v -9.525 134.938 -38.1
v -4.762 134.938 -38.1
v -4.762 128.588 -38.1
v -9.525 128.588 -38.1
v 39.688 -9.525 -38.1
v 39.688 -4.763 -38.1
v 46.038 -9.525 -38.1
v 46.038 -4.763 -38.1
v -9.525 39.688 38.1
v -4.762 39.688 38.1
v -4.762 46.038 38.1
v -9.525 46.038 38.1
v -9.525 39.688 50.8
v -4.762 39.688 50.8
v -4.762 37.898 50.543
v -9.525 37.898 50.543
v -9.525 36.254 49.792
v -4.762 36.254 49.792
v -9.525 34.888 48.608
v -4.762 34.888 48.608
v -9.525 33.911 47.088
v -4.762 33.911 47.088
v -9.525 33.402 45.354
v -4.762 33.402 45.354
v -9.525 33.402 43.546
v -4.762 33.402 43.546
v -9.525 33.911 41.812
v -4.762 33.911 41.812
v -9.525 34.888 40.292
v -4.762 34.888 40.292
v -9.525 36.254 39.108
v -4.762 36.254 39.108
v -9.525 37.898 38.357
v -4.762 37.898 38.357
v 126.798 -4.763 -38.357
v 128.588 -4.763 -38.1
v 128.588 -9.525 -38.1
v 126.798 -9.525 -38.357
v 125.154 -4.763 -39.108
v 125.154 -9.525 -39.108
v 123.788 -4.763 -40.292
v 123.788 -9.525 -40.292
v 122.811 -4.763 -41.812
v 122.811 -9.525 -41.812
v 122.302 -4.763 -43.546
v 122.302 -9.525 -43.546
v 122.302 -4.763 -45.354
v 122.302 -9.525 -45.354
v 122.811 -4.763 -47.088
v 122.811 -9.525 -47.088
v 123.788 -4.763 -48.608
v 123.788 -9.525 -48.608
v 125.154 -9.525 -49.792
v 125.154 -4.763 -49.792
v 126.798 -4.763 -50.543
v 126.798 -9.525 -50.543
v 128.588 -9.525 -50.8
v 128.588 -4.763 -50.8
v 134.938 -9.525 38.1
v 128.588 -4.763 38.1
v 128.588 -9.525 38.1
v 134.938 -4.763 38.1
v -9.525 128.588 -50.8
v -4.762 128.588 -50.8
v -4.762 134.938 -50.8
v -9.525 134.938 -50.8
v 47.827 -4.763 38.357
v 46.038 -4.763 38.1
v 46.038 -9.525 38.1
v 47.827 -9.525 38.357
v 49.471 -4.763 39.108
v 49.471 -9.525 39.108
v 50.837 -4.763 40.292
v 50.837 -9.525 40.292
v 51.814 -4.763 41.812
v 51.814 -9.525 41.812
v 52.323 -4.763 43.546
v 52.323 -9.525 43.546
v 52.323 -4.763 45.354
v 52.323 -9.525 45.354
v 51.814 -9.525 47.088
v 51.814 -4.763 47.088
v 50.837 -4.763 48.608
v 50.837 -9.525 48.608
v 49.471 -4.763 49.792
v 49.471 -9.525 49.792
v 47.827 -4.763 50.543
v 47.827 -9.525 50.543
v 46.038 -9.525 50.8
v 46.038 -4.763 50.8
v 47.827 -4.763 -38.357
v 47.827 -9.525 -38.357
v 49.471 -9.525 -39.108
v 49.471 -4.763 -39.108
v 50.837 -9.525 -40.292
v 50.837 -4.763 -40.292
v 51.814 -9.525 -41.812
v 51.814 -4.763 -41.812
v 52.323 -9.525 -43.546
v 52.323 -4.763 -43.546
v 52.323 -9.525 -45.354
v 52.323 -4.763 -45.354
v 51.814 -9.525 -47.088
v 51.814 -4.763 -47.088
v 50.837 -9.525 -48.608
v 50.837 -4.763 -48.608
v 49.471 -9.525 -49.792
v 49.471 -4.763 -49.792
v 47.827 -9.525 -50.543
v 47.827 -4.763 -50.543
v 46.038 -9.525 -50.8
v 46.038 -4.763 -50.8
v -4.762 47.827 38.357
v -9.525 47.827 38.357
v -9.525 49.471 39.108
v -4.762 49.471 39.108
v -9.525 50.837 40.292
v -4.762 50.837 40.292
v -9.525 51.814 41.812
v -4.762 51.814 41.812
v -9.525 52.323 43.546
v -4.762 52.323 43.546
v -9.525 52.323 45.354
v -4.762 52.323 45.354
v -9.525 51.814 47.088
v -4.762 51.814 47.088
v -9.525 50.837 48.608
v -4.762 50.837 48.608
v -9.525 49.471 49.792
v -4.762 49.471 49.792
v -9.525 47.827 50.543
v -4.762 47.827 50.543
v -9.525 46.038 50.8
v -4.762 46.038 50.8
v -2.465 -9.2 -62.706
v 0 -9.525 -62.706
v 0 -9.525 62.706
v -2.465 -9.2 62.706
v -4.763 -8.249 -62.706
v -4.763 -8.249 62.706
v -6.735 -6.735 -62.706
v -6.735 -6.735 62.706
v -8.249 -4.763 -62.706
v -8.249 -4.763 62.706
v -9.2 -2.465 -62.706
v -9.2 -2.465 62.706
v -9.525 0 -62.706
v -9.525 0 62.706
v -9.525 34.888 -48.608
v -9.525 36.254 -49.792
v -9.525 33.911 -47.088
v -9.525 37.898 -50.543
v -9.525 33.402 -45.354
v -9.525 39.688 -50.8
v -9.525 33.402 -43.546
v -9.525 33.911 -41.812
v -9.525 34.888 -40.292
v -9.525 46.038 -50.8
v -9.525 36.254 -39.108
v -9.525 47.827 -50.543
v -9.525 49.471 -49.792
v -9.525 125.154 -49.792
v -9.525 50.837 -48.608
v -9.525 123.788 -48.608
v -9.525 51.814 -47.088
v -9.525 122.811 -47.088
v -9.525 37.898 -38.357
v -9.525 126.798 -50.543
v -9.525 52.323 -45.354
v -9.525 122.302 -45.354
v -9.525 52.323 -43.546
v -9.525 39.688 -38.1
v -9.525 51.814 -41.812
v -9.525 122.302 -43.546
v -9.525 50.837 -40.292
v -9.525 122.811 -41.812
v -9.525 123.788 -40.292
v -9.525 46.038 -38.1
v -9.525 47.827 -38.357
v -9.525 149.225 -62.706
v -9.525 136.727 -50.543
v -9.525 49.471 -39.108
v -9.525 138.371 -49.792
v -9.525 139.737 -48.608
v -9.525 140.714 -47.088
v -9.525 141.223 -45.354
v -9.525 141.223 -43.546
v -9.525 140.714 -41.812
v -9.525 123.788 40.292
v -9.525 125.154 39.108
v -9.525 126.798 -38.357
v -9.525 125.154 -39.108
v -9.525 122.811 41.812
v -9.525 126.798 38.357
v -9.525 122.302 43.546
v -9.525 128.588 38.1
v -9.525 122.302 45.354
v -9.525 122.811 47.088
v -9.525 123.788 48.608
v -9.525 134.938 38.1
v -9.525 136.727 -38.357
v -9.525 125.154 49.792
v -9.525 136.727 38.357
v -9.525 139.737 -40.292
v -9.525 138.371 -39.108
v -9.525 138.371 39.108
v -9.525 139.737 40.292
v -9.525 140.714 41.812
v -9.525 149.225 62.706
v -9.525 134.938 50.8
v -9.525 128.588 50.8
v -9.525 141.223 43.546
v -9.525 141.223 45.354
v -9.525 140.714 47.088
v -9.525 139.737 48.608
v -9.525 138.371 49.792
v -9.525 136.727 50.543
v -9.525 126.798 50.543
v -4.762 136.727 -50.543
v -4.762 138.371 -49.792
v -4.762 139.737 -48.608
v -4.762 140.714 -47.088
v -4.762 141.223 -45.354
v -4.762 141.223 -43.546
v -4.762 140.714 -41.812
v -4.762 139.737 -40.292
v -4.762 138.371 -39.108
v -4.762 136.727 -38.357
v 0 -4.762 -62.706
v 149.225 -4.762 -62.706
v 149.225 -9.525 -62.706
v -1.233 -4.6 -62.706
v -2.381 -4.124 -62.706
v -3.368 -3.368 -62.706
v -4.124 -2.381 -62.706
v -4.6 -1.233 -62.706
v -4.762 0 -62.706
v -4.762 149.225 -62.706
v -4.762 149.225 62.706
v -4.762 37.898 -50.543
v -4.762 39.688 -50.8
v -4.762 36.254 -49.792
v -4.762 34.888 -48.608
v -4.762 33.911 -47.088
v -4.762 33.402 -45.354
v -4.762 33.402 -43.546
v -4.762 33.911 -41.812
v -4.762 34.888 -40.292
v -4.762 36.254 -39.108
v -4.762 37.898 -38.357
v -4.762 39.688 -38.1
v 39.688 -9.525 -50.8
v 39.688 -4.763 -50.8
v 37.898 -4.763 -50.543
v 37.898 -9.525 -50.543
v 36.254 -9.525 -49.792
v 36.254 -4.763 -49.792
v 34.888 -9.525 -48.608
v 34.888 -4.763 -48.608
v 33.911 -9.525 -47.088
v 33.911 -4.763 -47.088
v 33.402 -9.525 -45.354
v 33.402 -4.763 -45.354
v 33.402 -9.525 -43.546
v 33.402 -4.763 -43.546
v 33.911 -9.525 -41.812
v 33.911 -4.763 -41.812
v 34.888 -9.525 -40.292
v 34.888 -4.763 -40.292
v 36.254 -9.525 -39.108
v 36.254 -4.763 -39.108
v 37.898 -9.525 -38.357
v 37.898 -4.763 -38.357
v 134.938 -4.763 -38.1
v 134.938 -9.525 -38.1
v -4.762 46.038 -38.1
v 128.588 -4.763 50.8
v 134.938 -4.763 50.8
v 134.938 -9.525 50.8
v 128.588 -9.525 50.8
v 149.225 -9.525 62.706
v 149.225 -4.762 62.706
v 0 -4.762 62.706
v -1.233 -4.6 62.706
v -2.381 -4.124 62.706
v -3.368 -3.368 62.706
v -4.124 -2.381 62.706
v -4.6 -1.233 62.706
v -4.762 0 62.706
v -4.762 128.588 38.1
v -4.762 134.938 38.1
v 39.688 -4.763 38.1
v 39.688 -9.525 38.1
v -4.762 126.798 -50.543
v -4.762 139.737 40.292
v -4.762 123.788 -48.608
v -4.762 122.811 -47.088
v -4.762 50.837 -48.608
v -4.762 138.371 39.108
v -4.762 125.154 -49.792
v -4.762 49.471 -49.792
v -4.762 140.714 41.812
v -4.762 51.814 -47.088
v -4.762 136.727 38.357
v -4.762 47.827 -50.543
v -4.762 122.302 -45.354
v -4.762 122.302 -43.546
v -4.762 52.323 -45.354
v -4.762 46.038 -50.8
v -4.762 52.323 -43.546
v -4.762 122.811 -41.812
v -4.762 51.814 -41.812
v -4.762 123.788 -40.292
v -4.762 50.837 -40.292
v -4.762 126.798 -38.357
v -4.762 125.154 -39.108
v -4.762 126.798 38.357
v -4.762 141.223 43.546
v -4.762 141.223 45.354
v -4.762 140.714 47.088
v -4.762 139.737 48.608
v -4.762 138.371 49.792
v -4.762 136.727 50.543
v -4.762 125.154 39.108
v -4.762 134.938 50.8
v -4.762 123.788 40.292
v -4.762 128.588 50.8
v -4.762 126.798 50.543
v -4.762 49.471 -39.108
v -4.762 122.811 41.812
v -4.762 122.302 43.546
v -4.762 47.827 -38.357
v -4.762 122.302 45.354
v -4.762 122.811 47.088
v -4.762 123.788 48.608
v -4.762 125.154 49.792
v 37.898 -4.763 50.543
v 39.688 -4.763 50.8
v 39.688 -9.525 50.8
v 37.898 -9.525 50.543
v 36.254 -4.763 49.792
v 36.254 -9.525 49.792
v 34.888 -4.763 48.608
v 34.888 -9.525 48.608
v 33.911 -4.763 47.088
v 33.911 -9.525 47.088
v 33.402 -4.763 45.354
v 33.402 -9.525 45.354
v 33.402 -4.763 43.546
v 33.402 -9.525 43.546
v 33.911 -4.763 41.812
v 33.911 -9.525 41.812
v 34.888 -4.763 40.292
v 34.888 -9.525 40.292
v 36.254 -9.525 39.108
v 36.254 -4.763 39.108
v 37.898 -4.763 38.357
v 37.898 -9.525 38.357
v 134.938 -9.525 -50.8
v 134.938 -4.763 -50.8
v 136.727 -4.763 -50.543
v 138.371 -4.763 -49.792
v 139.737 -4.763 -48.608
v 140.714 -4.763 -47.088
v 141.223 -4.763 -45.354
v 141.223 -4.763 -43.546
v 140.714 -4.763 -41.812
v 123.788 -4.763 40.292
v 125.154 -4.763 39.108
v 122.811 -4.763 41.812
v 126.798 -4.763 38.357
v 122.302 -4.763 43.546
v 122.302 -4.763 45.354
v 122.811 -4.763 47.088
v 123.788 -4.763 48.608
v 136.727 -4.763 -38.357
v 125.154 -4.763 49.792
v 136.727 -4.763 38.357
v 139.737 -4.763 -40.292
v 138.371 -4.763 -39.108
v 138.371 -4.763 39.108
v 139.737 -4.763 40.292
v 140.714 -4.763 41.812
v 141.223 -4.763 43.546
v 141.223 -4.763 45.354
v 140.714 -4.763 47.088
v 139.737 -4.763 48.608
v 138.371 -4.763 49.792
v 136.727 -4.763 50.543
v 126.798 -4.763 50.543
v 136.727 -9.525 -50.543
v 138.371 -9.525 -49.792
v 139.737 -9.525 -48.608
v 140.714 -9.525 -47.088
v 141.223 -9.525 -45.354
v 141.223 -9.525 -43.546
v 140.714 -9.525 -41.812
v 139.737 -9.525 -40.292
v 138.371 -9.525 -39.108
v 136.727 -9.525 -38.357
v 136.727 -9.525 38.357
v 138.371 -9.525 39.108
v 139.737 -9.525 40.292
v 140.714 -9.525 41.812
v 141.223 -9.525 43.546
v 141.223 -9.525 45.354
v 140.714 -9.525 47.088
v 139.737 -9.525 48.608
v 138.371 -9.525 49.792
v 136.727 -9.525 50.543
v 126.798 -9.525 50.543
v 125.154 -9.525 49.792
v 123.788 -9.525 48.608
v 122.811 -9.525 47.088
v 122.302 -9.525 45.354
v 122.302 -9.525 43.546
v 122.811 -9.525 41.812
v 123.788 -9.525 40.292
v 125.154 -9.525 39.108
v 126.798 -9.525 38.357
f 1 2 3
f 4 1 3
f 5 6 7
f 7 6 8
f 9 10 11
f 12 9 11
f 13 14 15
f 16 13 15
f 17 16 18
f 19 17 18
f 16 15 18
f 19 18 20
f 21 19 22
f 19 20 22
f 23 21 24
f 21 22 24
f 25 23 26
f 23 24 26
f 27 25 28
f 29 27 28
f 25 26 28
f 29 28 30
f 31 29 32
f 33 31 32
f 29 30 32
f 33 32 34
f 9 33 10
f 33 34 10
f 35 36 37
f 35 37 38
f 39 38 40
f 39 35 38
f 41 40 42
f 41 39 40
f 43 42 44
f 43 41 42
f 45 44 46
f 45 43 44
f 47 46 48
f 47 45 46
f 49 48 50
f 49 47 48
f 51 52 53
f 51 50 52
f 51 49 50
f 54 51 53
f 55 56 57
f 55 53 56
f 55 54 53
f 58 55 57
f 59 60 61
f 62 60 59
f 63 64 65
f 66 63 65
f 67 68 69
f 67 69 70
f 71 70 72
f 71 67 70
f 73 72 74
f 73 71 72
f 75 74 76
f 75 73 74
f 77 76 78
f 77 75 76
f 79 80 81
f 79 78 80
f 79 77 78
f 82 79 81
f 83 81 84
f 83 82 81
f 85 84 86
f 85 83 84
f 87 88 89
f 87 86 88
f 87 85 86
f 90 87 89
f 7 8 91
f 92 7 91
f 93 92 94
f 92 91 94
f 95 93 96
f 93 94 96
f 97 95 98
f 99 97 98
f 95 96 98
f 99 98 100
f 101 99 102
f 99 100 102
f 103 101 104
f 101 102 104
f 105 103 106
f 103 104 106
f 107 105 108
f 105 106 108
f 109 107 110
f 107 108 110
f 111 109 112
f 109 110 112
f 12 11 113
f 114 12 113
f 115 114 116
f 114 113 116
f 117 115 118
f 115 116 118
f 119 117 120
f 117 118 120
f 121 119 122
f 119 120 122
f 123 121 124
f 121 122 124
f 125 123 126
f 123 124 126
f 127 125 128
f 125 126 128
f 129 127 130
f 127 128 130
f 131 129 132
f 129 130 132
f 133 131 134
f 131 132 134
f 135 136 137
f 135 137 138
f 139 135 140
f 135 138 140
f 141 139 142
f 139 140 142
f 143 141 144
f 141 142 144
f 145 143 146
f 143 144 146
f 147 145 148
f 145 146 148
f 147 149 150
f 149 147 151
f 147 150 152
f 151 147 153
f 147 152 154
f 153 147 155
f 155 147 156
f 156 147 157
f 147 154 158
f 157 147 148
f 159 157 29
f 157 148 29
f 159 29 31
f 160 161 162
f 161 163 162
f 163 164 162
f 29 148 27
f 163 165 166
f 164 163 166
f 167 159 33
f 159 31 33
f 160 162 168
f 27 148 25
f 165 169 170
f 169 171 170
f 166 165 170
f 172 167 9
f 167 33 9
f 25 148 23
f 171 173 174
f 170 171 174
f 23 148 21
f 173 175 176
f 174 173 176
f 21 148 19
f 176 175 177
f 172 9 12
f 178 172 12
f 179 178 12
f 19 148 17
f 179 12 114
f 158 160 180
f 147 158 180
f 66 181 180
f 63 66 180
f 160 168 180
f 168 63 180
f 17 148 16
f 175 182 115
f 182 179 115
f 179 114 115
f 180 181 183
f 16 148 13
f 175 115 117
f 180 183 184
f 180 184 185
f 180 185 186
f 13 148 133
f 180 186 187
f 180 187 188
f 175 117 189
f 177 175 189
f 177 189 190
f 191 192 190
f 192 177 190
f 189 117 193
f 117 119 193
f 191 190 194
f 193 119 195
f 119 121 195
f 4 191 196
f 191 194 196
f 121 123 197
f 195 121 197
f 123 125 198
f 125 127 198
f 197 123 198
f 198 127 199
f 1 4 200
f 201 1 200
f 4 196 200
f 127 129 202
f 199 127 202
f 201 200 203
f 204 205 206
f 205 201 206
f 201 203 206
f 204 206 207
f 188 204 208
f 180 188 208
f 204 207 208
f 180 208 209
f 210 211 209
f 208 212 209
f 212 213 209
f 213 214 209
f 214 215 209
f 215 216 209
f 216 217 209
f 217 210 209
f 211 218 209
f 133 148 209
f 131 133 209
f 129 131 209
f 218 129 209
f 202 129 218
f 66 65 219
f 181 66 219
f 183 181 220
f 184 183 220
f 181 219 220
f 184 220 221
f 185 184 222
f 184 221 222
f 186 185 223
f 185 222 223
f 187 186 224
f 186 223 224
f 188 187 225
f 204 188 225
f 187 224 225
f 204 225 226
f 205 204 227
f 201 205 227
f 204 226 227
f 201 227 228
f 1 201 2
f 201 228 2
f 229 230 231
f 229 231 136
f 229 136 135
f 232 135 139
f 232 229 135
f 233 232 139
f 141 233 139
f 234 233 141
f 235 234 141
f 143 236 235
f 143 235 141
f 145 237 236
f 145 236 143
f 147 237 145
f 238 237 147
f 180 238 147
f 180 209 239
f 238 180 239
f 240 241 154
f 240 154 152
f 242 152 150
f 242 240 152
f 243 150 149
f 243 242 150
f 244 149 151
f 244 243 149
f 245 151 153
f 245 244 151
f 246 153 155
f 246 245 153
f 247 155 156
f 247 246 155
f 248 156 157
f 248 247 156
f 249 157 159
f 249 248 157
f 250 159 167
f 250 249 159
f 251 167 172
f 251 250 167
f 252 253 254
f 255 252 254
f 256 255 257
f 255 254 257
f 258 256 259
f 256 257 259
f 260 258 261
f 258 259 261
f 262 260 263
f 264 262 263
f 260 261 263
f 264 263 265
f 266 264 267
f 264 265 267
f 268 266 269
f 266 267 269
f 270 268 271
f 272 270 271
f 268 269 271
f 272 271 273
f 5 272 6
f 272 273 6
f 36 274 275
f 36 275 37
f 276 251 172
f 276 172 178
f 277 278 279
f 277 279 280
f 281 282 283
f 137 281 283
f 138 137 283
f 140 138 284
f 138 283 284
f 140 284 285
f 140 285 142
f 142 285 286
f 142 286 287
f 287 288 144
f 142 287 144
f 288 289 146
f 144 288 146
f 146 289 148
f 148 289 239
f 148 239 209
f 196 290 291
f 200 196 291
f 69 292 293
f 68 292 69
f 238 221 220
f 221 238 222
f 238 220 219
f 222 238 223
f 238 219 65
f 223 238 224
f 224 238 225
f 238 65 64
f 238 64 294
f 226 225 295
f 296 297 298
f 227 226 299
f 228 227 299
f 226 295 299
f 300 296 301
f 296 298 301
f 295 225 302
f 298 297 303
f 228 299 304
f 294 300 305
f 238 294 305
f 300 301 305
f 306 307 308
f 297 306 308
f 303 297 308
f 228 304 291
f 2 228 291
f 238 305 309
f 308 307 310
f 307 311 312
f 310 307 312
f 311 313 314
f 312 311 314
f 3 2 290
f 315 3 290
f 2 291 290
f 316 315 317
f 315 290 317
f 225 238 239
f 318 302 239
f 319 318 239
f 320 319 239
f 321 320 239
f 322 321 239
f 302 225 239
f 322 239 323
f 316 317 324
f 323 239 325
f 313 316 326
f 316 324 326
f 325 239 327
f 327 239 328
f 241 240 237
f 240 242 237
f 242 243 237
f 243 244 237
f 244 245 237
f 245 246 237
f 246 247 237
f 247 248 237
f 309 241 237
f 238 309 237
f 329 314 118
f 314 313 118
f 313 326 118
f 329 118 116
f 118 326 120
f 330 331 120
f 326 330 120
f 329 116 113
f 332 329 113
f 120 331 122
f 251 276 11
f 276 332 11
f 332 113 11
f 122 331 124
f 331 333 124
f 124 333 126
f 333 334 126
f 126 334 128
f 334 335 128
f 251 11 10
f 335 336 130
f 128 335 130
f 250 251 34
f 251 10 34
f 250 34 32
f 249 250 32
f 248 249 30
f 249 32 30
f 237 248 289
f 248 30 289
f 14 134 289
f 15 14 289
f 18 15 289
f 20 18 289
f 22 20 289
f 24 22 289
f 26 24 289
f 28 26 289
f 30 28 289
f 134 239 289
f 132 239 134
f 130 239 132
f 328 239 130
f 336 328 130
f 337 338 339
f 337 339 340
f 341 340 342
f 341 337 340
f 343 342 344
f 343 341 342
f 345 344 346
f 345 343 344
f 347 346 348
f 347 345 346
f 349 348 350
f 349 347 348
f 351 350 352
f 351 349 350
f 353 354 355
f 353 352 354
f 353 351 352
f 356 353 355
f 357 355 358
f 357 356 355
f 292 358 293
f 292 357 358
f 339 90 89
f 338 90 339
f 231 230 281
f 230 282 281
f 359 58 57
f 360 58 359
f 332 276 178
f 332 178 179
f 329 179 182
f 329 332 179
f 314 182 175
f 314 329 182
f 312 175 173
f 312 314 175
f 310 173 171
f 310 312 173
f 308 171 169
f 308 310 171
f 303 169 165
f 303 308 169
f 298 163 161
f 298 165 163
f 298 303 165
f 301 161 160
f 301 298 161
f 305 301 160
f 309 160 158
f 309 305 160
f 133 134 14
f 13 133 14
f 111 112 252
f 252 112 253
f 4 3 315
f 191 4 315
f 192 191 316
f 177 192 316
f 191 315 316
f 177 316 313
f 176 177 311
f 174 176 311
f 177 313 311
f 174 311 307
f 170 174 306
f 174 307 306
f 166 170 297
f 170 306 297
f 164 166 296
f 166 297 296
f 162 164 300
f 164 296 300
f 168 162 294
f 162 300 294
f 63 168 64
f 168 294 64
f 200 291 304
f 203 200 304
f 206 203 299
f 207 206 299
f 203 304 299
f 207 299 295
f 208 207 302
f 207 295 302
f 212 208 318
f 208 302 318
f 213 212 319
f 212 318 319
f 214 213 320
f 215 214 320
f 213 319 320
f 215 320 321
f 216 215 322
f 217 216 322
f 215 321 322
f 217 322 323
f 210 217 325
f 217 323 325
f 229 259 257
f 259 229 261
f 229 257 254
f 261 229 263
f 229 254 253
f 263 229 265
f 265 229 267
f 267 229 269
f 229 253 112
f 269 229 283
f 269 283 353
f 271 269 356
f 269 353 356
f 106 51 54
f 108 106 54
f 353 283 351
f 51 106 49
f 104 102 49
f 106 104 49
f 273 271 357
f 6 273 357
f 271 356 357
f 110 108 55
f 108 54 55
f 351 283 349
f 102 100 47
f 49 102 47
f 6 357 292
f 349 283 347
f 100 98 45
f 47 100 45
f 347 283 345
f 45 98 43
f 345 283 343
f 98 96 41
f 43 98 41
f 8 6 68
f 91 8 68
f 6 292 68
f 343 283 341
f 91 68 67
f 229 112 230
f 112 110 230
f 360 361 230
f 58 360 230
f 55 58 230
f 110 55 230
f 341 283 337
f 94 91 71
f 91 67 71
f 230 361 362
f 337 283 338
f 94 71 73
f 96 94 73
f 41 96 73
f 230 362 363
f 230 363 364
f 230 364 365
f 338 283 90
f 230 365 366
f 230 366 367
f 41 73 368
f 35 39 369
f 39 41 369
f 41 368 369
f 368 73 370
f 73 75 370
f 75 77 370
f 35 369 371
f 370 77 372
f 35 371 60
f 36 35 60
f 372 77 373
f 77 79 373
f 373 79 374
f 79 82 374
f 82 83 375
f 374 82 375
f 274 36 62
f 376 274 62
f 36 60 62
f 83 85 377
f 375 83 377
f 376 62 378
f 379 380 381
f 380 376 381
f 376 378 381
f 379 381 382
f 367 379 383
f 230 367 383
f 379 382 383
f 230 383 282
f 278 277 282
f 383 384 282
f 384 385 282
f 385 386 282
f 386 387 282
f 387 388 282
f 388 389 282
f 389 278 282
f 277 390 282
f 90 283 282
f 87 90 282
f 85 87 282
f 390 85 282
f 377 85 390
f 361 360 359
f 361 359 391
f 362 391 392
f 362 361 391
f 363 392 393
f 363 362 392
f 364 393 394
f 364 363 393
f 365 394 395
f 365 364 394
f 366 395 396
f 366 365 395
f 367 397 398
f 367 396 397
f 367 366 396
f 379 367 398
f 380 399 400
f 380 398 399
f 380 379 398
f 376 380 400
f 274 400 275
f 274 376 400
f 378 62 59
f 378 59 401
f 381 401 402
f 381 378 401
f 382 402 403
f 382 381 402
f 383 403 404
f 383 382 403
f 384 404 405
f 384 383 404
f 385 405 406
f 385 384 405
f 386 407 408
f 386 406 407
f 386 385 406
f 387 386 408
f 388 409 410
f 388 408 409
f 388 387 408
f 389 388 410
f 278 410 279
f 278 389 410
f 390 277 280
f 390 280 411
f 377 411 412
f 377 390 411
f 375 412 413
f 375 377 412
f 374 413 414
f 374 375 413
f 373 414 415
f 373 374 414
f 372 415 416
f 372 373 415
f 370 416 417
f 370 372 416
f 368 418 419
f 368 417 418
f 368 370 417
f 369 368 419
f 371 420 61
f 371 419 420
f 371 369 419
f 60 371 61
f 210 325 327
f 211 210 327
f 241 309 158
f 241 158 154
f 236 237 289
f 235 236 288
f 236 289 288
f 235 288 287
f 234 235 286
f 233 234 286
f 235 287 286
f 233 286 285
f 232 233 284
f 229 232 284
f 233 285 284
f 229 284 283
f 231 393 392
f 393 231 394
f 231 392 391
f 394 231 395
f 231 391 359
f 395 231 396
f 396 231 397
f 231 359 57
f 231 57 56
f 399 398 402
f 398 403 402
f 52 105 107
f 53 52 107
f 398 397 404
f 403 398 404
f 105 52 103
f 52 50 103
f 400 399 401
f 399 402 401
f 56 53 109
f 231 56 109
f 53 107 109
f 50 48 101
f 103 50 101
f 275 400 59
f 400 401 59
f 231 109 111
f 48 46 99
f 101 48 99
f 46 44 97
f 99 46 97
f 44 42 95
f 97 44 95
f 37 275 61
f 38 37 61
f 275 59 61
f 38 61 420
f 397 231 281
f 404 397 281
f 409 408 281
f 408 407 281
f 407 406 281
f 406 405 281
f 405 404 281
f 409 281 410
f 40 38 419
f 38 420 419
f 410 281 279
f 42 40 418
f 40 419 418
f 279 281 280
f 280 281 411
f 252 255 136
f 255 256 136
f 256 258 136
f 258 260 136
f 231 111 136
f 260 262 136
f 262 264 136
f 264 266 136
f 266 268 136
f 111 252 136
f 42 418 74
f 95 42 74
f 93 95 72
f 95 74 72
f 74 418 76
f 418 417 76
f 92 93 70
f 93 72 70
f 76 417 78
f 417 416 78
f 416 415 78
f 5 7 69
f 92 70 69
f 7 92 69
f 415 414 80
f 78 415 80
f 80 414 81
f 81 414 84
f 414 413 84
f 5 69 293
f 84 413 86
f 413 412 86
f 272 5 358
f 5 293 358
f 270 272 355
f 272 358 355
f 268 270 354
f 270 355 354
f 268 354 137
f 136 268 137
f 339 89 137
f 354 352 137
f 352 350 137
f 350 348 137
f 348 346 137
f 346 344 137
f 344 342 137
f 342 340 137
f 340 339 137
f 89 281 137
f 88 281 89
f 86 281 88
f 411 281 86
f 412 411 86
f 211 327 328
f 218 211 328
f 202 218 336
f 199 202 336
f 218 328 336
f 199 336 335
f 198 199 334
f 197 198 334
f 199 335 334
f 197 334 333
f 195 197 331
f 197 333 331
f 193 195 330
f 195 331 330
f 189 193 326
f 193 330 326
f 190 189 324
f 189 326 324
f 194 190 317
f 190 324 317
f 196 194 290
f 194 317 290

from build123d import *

# Parameters (mm, degrees)
BOSS_EXTRUDE1_DEPTH = 62.70625
CUT_EXTRUDE1_DEPTH  = 224.410663511


with BuildPart() as part:
    # Sketch1 → Boss-Extrude1 (new, symmetric)
    with BuildSketch(Plane.XY):
        with BuildLine():
            Line((-9.525, 149.225), (-4.7625, 149.225))
            Line((-4.7625, 149.225), (-4.7625, 0))
            ThreePointArc((-4.7625, 0), (-3.367596045, -3.367596045), (0, -4.7625))
            Line((0, -4.7625), (149.225, -4.7625))
            Line((149.225, -4.7625), (149.225, -9.525))
            Line((149.225, -9.525), (0, -9.525))
            ThreePointArc((0, -9.525), (-6.735192091, -6.735192091), (-9.525, 0))
            Line((-9.525, 0), (-9.525, 149.225))
        make_face()
    extrude(amount=BOSS_EXTRUDE1_DEPTH, both=True)

    # Sketch2 → Cut-Extrude1 (cut, through all)
    with BuildSketch(Plane(origin=(-4.7625, 0, 0), x_dir=(0, 0, -1), z_dir=(1, 0, 0))):
        with BuildLine():
            Line((-50.8, 134.9375), (-50.8, 128.5875))
            ThreePointArc((-50.8, 128.5875), (-44.45, 122.2375), (-38.1, 128.5875))
            Line((-38.1, 128.5875), (-38.1, 134.9375))
            ThreePointArc((-38.1, 134.9375), (-44.45, 141.2875), (-50.8, 134.9375))
        make_face()
        with BuildLine():
            Line((-50.8, 46.0375), (-50.8, 39.6875))
            ThreePointArc((-50.8, 39.6875), (-44.45, 33.3375), (-38.1, 39.6875))
            Line((-38.1, 39.6875), (-38.1, 46.0375))
            ThreePointArc((-38.1, 46.0375), (-44.45, 52.3875), (-50.8, 46.0375))
        make_face()
        with BuildLine():
            Line((38.1, 39.6875), (38.1, 46.0375))
            ThreePointArc((38.1, 46.0375), (44.45, 52.3875), (50.8, 46.0375))
            Line((50.8, 46.0375), (50.8, 39.6875))
            ThreePointArc((50.8, 39.6875), (44.45, 33.3375), (38.1, 39.6875))
        make_face()
        with BuildLine():
            Line((38.1, 134.9375), (38.1, 128.5875))
            ThreePointArc((38.1, 128.5875), (44.45, 122.2375), (50.8, 128.5875))
            Line((50.8, 128.5875), (50.8, 134.9375))
            ThreePointArc((50.8, 134.9375), (44.45, 141.2875), (38.1, 134.9375))
        make_face()
    cut_extrude1 = extrude(amount=-CUT_EXTRUDE1_DEPTH, mode=Mode.SUBTRACT)

    # Mirror1: Cut-Extrude1 across plane
    add(cut_extrude1.mirror(Plane(origin=(0, 0, 0), x_dir=(0, 0, 1), z_dir=(0.7071067811865475, -0.7071067811865476, 0))), mode=Mode.SUBTRACT)


solid = part.part
